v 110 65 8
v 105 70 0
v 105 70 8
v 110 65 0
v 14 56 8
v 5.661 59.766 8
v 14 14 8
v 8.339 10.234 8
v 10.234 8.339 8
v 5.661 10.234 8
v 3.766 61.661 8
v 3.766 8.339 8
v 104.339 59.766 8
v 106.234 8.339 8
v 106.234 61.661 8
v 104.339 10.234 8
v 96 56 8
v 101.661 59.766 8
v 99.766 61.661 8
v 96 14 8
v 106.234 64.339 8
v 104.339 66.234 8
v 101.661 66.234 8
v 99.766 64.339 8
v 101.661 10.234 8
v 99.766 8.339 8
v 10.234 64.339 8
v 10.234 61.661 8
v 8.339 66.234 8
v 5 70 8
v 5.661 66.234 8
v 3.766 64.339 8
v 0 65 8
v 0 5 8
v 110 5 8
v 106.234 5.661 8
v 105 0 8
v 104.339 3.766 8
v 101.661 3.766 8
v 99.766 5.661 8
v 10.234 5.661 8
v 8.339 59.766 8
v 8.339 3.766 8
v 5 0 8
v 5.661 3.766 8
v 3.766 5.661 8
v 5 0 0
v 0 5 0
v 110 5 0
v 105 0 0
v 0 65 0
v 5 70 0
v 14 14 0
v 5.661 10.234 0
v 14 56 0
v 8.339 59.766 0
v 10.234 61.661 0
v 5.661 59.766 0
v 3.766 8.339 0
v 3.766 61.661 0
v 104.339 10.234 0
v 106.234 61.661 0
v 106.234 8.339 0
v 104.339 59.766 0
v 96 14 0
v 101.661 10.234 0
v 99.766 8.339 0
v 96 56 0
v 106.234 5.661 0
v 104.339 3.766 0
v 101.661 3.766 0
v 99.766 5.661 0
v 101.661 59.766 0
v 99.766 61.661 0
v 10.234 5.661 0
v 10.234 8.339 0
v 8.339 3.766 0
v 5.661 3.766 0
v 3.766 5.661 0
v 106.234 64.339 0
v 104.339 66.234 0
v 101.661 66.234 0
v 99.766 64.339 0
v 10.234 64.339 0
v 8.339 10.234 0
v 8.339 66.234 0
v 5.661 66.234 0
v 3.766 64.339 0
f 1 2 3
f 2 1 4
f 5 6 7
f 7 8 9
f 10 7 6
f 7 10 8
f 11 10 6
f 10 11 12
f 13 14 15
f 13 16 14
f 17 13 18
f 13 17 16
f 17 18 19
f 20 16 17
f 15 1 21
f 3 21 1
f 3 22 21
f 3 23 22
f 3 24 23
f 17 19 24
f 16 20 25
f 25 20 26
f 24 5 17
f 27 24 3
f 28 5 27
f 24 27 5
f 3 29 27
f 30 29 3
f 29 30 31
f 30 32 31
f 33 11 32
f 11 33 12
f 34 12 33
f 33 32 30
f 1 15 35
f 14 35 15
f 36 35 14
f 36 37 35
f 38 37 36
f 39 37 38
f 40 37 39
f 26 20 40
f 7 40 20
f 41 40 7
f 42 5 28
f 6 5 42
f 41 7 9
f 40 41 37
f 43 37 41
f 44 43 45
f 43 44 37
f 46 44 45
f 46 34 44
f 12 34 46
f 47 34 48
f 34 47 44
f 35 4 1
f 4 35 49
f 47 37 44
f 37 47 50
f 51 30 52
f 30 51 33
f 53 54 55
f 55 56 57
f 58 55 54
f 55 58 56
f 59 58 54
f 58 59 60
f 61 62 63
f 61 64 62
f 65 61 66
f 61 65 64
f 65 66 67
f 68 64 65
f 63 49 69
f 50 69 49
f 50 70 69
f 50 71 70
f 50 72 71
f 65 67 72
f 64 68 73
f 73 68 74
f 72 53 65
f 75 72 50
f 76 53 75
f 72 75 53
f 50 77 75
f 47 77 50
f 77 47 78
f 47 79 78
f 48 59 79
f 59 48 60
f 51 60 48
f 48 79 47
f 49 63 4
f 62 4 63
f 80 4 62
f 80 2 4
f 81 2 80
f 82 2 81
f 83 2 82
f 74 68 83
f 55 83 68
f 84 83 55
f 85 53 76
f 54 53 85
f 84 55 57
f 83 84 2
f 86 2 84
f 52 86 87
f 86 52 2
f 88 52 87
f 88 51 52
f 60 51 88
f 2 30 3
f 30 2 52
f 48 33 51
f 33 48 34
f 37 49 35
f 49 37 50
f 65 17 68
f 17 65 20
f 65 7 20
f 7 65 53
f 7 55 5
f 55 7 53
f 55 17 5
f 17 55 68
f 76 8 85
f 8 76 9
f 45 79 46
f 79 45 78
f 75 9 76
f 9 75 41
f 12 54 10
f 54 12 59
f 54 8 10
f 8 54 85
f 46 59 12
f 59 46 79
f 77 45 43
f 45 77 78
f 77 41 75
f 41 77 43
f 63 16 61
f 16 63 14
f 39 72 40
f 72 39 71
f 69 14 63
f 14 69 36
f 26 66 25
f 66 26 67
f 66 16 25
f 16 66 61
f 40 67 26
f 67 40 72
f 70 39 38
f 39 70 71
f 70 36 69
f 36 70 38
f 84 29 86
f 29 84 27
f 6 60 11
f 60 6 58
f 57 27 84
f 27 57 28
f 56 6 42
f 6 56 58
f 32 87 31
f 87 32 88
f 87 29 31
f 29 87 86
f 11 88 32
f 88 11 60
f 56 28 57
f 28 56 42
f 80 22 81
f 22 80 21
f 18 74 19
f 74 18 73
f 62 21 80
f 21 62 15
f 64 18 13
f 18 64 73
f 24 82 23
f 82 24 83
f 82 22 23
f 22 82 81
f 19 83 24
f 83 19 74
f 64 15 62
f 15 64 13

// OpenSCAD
$fn = 32;

// ----------------------------------------------------------------------
// Frame plate: 110 x 70 frame, 14 mm rails
// ----------------------------------------------------------------------

// --- parameters (mm) ---
plate_l = 110;            // plate length, X
plate_w = 70;             // plate width, Y
plate_t = 8;              // plate thickness, Z (extrusion height)
corner_c = 5;             // corner chamfer
frame_bar = 14;           // frame rail width
bolt_r = 3.5;             // corner bolt window radius
bolt_inset = 7;           // bolt centre inset from the edges

win_l = plate_l - 2 * frame_bar;  // window length
win_w = plate_w - 2 * frame_bar;  // window width
bolt_d = 2 * bolt_r;  // corner hole diameter

profile = [[5, 0], [105, 0], [110, 5], [110, 65], [105, 70], [5, 70], [0, 65], [0, 5]];  // primary outline, 8 points, counter clockwise
void_1 = [[14, 14], [96, 14], [96, 56], [14, 56]];  // the window, 4 points
void_2 = [[10.234, 8.339], [8.339, 10.234], [5.661, 10.234], [3.766, 8.339], [3.766, 5.661], [5.661, 3.766], [8.339, 3.766], [10.234, 5.661]];  // corner bolt window, 8 points
void_3 = [[106.234, 8.339], [104.339, 10.234], [101.661, 10.234], [99.766, 8.339], [99.766, 5.661], [101.661, 3.766], [104.339, 3.766], [106.234, 5.661]];  // corner bolt window, 8 points
void_4 = [[10.234, 64.339], [8.339, 66.234], [5.661, 66.234], [3.766, 64.339], [3.766, 61.661], [5.661, 59.766], [8.339, 59.766], [10.234, 61.661]];  // corner bolt window, 8 points
void_5 = [[106.234, 64.339], [104.339, 66.234], [101.661, 66.234], [99.766, 64.339], [99.766, 61.661], [101.661, 59.766], [104.339, 59.766], [106.234, 61.661]];  // corner bolt window, 8 points

// --- the one profile operation ---
difference() {
  linear_extrude(height = plate_t) polygon(points = profile);
  translate([0, 0, -1])
    linear_extrude(height = plate_t + 2) polygon(points = void_1);
  translate([0, 0, -1])
    linear_extrude(height = plate_t + 2) polygon(points = void_2);
  translate([0, 0, -1])
    linear_extrude(height = plate_t + 2) polygon(points = void_3);
  translate([0, 0, -1])
    linear_extrude(height = plate_t + 2) polygon(points = void_4);
  translate([0, 0, -1])
    linear_extrude(height = plate_t + 2) polygon(points = void_5);
}
